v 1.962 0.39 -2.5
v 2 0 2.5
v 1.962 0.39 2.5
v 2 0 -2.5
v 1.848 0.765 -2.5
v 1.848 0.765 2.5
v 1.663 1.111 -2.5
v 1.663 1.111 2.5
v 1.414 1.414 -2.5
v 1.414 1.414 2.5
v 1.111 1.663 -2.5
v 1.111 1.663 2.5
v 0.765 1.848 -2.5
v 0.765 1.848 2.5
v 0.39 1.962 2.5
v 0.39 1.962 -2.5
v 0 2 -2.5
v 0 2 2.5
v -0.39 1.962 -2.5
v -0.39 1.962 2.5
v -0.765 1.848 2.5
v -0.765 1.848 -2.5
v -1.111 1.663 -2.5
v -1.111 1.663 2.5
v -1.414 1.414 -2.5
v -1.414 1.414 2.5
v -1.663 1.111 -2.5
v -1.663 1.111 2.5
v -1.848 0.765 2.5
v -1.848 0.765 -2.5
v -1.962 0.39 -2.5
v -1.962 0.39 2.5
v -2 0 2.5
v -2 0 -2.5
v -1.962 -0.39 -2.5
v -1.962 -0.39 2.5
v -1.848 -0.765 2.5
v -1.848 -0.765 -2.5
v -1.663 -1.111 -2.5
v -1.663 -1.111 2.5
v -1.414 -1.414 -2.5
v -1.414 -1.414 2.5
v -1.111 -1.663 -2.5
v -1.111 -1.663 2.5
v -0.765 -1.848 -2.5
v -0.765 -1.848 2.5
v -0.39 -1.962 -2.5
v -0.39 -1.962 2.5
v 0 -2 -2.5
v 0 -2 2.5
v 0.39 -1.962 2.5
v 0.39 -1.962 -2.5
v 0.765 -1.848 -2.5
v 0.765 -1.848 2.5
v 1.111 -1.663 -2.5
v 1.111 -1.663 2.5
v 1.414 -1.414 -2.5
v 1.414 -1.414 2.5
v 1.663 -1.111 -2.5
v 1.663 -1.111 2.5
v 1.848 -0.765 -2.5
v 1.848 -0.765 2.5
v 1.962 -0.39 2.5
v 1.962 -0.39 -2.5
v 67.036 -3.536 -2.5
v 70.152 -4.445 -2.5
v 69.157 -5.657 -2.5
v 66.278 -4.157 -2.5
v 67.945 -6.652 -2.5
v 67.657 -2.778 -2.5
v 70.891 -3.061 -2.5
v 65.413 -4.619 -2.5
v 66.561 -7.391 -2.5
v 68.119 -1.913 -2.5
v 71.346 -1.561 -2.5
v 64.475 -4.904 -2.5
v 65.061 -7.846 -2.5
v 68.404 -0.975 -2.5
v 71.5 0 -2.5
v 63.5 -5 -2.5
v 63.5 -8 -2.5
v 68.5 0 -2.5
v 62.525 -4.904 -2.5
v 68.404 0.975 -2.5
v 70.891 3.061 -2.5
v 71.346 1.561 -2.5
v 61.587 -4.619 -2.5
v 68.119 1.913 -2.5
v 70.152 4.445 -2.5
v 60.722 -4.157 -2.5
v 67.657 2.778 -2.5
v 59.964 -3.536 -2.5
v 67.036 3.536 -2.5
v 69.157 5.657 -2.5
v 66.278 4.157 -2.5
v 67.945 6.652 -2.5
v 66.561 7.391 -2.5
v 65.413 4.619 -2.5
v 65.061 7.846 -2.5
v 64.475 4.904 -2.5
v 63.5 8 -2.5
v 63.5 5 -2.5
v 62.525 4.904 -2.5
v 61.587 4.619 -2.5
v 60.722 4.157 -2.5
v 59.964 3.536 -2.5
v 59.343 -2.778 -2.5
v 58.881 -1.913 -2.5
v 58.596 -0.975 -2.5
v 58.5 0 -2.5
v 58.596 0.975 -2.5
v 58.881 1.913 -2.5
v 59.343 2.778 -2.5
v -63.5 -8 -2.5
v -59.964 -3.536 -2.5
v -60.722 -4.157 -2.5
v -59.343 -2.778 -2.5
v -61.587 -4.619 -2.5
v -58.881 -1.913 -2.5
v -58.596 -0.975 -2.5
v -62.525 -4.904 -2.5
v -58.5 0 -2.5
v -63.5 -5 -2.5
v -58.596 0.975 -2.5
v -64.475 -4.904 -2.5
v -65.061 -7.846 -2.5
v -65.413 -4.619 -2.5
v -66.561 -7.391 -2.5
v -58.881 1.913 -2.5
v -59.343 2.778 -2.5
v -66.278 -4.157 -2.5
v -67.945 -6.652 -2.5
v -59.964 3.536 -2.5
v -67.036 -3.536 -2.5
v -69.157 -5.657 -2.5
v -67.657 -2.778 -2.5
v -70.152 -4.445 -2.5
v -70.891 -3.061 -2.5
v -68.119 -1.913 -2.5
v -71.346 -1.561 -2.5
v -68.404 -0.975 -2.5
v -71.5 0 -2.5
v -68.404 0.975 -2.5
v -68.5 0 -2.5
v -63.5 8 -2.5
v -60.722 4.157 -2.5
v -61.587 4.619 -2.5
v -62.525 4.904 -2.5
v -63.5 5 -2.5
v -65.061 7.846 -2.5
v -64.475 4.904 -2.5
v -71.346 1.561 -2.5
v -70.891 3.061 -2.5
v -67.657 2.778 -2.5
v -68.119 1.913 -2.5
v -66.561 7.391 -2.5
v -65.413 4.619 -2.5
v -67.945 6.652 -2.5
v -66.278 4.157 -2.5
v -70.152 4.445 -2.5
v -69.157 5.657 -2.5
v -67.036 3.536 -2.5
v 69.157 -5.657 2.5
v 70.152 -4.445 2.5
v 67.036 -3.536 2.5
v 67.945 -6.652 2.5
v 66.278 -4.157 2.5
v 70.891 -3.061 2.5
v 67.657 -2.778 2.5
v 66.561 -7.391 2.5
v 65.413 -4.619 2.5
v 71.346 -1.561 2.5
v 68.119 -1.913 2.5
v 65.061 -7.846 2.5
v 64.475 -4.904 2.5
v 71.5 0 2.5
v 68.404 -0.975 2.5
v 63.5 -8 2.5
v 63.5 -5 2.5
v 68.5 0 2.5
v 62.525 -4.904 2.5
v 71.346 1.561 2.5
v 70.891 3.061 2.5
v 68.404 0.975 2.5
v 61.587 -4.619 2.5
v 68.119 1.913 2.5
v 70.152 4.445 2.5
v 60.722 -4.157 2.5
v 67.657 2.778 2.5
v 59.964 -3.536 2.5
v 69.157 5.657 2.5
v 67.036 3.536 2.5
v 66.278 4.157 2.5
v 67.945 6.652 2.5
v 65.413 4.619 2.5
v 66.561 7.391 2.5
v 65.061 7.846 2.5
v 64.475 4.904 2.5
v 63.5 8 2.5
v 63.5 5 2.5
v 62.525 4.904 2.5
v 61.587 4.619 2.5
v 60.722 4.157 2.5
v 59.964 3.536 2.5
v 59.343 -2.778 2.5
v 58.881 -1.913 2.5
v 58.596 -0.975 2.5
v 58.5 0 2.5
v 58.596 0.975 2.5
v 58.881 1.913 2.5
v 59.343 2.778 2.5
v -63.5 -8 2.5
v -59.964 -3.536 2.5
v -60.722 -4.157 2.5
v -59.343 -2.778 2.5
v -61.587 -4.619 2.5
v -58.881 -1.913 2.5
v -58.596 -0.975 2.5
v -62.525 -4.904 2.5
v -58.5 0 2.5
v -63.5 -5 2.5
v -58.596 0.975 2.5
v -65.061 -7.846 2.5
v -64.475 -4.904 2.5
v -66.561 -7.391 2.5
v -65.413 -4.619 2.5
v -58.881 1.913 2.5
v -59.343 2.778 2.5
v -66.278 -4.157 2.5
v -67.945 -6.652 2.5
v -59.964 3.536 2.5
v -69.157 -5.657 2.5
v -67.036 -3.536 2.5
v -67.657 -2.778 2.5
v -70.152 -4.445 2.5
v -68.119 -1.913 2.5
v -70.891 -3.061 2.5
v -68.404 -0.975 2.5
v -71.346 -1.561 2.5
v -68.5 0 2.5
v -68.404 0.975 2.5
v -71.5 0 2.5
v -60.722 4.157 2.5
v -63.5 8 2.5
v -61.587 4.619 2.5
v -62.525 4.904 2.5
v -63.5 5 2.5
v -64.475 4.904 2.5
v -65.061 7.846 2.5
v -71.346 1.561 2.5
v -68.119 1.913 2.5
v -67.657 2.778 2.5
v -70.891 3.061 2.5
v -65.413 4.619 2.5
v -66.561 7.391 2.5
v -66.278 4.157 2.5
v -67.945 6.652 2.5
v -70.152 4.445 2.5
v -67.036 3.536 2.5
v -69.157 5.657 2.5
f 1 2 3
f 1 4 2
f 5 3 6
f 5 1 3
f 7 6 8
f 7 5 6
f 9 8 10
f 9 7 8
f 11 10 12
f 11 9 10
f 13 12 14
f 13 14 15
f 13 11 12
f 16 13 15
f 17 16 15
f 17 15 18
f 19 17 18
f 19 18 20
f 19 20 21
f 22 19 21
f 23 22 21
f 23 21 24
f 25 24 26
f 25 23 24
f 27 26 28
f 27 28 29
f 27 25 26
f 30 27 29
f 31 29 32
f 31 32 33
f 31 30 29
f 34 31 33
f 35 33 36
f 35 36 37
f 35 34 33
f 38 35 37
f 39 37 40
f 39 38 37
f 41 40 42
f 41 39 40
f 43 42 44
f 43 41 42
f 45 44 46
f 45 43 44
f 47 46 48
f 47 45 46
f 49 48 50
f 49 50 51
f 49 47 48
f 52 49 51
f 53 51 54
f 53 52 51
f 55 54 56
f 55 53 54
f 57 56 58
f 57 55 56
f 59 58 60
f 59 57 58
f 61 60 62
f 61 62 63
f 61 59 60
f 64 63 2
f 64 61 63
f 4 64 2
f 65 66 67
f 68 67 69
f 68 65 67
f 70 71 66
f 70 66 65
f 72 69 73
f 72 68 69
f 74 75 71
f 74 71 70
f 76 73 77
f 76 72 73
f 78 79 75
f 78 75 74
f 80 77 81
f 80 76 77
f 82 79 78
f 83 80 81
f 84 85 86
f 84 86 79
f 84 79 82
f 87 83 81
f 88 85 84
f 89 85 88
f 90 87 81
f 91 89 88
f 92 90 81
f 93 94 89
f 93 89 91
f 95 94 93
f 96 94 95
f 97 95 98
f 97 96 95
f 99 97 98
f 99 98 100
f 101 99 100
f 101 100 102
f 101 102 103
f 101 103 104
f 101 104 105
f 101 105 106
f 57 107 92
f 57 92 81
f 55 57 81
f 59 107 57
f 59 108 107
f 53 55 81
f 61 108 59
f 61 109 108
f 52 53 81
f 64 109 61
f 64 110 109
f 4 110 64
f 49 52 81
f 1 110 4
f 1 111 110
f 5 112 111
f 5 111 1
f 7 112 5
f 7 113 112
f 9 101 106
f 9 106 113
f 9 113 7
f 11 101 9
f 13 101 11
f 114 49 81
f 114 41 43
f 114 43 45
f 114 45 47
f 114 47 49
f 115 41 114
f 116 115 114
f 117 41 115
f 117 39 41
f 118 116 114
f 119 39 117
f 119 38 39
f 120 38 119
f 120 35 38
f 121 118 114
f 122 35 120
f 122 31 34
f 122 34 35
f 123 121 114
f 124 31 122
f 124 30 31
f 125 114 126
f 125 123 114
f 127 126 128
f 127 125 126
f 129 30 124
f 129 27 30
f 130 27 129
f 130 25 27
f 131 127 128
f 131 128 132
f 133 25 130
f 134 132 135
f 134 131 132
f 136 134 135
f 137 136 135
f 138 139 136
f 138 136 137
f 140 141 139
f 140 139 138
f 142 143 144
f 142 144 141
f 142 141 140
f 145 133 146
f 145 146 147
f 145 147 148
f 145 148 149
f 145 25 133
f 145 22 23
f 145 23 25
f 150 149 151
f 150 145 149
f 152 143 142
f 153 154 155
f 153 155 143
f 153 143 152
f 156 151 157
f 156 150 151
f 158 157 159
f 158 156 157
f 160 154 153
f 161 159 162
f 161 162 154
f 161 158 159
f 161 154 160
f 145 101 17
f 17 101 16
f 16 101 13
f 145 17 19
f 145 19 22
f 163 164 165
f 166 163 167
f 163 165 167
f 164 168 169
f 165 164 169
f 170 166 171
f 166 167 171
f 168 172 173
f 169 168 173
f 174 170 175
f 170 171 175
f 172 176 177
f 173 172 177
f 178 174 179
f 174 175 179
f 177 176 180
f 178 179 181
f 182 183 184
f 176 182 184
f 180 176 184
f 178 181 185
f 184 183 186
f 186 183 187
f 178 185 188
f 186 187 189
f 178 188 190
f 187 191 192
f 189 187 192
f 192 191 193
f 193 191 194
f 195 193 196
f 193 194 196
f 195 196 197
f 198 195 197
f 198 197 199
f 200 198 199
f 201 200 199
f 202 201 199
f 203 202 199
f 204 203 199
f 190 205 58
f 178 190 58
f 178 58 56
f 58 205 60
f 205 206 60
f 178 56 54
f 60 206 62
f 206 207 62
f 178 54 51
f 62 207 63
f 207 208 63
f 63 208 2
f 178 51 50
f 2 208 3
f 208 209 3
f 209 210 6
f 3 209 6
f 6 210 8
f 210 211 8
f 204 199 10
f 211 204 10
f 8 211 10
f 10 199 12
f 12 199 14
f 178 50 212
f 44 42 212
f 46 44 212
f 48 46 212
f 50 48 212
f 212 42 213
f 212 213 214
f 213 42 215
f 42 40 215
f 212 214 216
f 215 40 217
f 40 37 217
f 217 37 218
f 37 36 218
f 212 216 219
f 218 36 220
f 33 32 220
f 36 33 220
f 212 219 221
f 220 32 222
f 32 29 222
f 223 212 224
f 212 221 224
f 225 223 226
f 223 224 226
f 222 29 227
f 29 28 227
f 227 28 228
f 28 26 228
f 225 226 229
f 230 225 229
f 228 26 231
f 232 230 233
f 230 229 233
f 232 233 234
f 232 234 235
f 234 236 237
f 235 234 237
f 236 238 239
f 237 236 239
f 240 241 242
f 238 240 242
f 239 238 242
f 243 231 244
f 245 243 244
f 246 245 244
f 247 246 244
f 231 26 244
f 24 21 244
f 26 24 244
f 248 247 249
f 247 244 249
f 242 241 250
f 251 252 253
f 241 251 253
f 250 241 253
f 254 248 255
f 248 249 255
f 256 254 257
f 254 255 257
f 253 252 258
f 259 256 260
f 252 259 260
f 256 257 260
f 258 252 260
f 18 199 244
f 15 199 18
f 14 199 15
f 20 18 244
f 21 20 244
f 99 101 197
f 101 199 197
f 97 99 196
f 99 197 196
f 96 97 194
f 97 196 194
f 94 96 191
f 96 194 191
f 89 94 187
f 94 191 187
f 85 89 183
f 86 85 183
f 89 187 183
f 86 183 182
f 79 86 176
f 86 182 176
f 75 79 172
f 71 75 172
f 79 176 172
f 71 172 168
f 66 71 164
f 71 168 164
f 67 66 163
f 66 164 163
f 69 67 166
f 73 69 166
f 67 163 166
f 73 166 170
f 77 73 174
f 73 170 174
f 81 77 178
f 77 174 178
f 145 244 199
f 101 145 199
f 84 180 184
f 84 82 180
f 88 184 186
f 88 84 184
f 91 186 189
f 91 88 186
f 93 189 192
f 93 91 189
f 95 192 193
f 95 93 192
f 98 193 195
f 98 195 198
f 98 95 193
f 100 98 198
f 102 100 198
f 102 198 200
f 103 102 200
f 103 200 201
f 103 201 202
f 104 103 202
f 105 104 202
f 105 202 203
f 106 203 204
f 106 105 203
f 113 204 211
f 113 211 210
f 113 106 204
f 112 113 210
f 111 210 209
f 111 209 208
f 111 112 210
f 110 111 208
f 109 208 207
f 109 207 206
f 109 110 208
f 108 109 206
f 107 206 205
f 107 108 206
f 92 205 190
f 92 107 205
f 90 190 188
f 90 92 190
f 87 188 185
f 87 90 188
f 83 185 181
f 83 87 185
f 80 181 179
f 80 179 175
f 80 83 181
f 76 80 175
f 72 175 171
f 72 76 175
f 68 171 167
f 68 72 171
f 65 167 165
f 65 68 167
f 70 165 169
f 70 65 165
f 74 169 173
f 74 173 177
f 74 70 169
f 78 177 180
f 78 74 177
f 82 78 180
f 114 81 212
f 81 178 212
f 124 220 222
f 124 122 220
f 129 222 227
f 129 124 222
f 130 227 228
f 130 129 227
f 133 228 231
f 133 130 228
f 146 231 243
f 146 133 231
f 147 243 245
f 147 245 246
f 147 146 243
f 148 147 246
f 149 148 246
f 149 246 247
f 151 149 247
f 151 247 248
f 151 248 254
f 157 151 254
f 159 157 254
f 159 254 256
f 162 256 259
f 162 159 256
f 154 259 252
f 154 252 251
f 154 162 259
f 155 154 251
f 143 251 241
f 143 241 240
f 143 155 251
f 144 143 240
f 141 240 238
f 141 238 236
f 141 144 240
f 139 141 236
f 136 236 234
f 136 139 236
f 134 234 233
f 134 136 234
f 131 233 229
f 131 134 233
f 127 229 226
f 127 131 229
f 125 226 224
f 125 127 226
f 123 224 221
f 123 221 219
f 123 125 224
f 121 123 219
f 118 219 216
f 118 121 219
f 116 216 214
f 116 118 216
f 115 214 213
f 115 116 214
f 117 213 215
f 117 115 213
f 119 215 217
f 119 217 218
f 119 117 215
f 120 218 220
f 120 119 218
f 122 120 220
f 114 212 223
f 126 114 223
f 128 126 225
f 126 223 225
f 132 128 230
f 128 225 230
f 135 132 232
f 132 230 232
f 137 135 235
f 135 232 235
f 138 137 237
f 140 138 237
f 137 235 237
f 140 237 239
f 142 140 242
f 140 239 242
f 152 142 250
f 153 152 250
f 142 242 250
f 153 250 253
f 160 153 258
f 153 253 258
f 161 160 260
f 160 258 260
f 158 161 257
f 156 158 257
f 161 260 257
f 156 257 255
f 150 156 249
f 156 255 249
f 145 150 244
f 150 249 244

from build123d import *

# Parameters (mm, degrees)
SKETCH1_R           = 5
SKETCH1_R_2         = 2
BOSS_EXTRUDE1_DEPTH = 2.5


with BuildPart() as part:
    # Sketch1 → Boss-Extrude1 (new, symmetric)
    with BuildSketch(Plane.XY):
        with BuildLine():
            Line((-63.5, 8), (63.5, 8))
            ThreePointArc((63.5, 8), (71.5, 0), (63.5, -8))
            Line((63.5, -8), (-63.5, -8))
            ThreePointArc((-63.5, -8), (-71.5, 0), (-63.5, 8))
        make_face()
        with Locations((-63.5, 0)):
            Circle(SKETCH1_R, mode=Mode.SUBTRACT)
        with Locations((63.5, 0)):
            Circle(SKETCH1_R, mode=Mode.SUBTRACT)
        Circle(SKETCH1_R_2, mode=Mode.SUBTRACT)
    extrude(amount=BOSS_EXTRUDE1_DEPTH, both=True)


solid = part.part
